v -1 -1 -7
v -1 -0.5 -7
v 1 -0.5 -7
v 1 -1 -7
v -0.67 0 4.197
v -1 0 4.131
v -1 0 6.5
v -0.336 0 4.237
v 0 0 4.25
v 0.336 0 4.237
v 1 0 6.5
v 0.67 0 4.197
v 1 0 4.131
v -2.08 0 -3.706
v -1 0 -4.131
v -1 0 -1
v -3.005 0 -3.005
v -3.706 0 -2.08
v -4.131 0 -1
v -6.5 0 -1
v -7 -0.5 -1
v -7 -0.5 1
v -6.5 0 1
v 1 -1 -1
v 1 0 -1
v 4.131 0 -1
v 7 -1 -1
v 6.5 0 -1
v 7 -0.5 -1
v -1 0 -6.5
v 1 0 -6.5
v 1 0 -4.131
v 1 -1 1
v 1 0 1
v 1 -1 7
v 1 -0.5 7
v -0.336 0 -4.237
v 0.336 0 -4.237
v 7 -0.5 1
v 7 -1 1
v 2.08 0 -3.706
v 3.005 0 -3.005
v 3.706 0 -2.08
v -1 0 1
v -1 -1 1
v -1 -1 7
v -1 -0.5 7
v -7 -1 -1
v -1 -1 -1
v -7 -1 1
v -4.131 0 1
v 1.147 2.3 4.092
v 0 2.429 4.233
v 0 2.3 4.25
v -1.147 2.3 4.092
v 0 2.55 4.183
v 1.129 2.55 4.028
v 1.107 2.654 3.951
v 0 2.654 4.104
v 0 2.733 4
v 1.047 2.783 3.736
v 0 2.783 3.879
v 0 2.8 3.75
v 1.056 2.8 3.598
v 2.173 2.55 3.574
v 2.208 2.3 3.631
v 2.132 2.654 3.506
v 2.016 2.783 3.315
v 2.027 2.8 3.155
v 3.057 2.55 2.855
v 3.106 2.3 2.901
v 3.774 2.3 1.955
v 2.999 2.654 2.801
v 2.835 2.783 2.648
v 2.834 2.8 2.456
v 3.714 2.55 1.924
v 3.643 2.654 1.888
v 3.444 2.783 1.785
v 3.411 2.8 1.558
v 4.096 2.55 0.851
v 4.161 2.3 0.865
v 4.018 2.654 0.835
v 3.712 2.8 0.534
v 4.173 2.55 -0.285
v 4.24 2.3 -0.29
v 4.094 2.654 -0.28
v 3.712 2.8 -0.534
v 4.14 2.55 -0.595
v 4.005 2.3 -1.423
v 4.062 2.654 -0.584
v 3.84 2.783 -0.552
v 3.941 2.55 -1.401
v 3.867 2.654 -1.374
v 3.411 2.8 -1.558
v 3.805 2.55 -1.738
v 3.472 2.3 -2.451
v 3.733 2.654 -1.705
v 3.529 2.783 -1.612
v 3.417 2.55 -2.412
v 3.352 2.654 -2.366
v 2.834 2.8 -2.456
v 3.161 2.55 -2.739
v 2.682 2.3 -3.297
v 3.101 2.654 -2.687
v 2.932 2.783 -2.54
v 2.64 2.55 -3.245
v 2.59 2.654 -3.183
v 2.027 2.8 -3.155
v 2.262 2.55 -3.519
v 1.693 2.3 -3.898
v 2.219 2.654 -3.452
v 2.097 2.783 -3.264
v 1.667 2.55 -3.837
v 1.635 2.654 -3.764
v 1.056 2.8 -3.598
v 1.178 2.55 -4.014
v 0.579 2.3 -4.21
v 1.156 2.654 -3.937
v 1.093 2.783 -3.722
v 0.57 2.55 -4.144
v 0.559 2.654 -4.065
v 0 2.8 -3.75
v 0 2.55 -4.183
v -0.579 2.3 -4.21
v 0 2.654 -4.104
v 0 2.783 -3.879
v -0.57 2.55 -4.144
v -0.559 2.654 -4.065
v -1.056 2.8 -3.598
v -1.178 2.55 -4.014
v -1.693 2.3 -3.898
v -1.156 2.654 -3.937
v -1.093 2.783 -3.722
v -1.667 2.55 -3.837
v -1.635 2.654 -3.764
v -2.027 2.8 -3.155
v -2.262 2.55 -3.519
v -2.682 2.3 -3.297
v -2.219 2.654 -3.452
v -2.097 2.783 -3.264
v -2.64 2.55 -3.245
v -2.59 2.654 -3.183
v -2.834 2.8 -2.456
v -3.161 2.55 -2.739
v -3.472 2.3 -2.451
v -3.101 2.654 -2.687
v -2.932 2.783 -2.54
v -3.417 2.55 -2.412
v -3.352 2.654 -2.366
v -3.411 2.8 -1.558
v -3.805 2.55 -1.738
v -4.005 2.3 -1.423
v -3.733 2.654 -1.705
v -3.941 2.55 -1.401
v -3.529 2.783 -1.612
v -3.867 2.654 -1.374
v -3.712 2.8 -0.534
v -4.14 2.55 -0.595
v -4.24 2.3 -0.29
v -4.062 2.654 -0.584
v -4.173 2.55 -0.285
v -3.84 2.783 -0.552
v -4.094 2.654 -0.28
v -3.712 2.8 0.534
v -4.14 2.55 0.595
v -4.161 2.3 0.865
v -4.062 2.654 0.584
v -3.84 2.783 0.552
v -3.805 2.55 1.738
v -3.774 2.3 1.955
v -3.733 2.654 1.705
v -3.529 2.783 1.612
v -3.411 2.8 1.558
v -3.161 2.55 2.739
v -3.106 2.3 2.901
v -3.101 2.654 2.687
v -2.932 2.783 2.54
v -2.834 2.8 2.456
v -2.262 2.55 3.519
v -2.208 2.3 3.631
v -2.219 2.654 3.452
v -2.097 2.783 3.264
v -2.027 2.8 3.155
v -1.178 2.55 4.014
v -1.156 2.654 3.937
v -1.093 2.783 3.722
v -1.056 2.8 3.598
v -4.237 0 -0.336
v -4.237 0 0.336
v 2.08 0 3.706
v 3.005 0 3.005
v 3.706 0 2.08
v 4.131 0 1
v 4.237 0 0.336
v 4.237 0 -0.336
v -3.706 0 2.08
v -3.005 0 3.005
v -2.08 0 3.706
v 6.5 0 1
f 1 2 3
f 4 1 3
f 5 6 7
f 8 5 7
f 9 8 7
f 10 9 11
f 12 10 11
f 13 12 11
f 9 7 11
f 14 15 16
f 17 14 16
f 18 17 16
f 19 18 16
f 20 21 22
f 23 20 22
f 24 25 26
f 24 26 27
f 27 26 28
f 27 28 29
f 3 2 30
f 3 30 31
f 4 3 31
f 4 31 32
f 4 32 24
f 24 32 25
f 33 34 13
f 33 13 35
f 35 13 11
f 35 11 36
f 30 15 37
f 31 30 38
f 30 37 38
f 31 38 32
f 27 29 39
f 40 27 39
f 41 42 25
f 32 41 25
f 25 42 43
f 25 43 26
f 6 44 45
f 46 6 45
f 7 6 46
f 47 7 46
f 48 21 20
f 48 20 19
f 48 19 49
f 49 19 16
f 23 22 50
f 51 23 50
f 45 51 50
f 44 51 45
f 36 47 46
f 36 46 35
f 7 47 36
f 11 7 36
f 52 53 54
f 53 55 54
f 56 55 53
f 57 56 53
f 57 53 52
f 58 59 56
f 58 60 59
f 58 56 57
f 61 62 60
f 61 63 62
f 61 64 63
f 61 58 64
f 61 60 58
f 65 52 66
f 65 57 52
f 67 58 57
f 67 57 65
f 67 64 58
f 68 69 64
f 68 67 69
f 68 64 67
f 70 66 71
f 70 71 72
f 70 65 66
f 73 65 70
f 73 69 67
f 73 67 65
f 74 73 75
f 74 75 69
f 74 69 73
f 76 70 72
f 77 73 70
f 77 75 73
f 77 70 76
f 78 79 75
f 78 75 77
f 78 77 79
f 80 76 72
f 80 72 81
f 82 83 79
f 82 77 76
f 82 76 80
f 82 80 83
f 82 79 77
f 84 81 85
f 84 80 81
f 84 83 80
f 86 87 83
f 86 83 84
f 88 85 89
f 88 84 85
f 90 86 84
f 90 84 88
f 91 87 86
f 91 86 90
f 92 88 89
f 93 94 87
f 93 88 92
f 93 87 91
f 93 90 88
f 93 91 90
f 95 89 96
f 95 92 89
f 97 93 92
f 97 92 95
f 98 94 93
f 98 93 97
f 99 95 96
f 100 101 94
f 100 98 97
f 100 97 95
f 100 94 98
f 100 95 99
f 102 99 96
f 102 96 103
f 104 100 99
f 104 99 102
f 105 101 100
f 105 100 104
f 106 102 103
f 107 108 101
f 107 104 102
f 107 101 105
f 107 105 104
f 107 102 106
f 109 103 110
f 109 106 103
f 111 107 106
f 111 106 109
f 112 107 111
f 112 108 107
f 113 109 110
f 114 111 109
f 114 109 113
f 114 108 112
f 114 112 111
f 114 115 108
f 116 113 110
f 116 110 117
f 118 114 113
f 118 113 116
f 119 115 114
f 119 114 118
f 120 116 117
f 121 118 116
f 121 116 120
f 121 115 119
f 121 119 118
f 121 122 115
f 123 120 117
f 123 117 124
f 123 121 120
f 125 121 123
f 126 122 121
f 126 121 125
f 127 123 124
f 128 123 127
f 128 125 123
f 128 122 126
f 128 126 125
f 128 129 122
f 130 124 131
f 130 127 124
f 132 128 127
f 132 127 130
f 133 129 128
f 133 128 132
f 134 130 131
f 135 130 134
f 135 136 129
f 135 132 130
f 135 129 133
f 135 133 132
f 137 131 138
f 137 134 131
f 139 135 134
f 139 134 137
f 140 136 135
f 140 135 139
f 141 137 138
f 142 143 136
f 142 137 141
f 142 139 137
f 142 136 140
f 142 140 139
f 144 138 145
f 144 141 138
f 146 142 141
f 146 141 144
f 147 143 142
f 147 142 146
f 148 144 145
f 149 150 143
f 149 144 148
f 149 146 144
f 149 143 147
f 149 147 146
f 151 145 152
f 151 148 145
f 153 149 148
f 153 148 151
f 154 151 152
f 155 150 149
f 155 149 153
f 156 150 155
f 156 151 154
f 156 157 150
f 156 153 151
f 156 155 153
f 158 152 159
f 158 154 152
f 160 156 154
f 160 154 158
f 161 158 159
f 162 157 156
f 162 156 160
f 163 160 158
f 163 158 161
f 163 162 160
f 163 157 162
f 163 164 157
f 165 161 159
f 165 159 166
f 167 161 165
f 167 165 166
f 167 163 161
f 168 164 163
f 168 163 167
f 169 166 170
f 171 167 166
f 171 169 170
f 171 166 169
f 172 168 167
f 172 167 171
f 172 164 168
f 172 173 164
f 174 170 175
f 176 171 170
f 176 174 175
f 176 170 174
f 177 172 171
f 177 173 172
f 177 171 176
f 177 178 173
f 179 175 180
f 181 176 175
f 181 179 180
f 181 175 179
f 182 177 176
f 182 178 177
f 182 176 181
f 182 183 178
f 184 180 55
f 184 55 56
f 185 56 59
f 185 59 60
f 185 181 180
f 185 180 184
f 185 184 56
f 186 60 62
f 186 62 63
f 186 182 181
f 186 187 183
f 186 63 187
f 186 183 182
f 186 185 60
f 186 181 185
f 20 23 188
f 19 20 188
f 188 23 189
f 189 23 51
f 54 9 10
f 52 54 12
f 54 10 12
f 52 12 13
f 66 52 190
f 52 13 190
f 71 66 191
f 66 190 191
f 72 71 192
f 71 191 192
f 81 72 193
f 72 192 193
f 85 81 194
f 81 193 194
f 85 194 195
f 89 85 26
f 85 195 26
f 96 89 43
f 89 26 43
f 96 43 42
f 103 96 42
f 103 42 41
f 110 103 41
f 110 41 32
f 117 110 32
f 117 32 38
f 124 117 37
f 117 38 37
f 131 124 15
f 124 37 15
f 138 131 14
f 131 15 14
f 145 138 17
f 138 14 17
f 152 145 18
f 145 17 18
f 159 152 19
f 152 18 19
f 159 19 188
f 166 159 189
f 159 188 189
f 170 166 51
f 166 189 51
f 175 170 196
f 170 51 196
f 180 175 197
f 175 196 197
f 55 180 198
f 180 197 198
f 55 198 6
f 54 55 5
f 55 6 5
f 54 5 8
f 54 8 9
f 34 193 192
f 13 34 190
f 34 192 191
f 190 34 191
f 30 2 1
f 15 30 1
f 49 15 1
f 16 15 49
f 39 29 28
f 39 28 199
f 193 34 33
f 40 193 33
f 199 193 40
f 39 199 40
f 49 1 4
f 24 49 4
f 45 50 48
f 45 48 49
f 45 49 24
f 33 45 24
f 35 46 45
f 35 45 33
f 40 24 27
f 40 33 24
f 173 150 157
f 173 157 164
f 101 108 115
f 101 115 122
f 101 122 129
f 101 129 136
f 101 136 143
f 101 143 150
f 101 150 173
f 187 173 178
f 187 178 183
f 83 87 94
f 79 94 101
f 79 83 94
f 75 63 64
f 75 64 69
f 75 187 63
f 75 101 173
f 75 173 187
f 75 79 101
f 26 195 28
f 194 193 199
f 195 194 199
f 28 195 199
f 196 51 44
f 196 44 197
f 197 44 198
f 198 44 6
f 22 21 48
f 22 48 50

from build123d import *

# Parameters (mm, degrees)
SKETCH_1_R      = 4.25
EXTRUDE_1_DEPTH = 2.8
FILLET_1_R      = 0.5
SKETCH_2_W      = 14
SKETCH_2_H      = 2
EXTRUDE_2_DEPTH = 1
SKETCH_3_W      = 2
SKETCH_3_H      = 14
EXTRUDE_3_DEPTH = 1
CHAMFER_1_SIZE  = 0.5
CHAMFER_2_SIZE  = 0.5
CHAMFER_3_SIZE  = 0.5


with BuildPart() as part:
    # 草图1 → 凸台-拉伸1 (new body)
    with BuildSketch(Plane(origin=(0, 0, 0), x_dir=(1, 0, 0), z_dir=(0, 1, 0))):
        with Locations(Location((0, 0, 0), (0, 0, 270))):  # turned: the seam where the file's is
            Circle(SKETCH_1_R)
    extrude(amount=EXTRUDE_1_DEPTH)

    # 圆角1
    fillet_1_edges = [part.edges().sort_by_distance(p)[0] for p in [
        (0, 2.8, -4.25),
    ]]
    fillet(fillet_1_edges, radius=FILLET_1_R)

    # 草图2 → 凸台-拉伸2 (add)
    with BuildSketch(Plane.XZ):
        Rectangle(SKETCH_2_W, SKETCH_2_H)
    extrude(amount=EXTRUDE_2_DEPTH)

    # 草图3 → 凸台-拉伸3 (add)
    with BuildSketch(Plane.XZ):
        Rectangle(SKETCH_3_W, SKETCH_3_H)
    extrude(amount=EXTRUDE_3_DEPTH)

    # 倒角1
    chamfer_1_edges = [part.edges().sort_by_distance(p)[0] for p in [
        (0, 0, 7),
    ]]
    chamfer(chamfer_1_edges, length=CHAMFER_1_SIZE)

    # 倒角2
    chamfer_2_edges = [part.edges().sort_by_distance(p)[0] for p in [
        (7, 0, 0),
    ]]
    chamfer(chamfer_2_edges, length=CHAMFER_2_SIZE)

    # 倒角3
    chamfer_3_edges = [part.edges().sort_by_distance(p)[0] for p in [
        (-7, 0, 0),
        (0, 0, -7),
    ]]
    chamfer(chamfer_3_edges, length=CHAMFER_3_SIZE)


solid = part.part
